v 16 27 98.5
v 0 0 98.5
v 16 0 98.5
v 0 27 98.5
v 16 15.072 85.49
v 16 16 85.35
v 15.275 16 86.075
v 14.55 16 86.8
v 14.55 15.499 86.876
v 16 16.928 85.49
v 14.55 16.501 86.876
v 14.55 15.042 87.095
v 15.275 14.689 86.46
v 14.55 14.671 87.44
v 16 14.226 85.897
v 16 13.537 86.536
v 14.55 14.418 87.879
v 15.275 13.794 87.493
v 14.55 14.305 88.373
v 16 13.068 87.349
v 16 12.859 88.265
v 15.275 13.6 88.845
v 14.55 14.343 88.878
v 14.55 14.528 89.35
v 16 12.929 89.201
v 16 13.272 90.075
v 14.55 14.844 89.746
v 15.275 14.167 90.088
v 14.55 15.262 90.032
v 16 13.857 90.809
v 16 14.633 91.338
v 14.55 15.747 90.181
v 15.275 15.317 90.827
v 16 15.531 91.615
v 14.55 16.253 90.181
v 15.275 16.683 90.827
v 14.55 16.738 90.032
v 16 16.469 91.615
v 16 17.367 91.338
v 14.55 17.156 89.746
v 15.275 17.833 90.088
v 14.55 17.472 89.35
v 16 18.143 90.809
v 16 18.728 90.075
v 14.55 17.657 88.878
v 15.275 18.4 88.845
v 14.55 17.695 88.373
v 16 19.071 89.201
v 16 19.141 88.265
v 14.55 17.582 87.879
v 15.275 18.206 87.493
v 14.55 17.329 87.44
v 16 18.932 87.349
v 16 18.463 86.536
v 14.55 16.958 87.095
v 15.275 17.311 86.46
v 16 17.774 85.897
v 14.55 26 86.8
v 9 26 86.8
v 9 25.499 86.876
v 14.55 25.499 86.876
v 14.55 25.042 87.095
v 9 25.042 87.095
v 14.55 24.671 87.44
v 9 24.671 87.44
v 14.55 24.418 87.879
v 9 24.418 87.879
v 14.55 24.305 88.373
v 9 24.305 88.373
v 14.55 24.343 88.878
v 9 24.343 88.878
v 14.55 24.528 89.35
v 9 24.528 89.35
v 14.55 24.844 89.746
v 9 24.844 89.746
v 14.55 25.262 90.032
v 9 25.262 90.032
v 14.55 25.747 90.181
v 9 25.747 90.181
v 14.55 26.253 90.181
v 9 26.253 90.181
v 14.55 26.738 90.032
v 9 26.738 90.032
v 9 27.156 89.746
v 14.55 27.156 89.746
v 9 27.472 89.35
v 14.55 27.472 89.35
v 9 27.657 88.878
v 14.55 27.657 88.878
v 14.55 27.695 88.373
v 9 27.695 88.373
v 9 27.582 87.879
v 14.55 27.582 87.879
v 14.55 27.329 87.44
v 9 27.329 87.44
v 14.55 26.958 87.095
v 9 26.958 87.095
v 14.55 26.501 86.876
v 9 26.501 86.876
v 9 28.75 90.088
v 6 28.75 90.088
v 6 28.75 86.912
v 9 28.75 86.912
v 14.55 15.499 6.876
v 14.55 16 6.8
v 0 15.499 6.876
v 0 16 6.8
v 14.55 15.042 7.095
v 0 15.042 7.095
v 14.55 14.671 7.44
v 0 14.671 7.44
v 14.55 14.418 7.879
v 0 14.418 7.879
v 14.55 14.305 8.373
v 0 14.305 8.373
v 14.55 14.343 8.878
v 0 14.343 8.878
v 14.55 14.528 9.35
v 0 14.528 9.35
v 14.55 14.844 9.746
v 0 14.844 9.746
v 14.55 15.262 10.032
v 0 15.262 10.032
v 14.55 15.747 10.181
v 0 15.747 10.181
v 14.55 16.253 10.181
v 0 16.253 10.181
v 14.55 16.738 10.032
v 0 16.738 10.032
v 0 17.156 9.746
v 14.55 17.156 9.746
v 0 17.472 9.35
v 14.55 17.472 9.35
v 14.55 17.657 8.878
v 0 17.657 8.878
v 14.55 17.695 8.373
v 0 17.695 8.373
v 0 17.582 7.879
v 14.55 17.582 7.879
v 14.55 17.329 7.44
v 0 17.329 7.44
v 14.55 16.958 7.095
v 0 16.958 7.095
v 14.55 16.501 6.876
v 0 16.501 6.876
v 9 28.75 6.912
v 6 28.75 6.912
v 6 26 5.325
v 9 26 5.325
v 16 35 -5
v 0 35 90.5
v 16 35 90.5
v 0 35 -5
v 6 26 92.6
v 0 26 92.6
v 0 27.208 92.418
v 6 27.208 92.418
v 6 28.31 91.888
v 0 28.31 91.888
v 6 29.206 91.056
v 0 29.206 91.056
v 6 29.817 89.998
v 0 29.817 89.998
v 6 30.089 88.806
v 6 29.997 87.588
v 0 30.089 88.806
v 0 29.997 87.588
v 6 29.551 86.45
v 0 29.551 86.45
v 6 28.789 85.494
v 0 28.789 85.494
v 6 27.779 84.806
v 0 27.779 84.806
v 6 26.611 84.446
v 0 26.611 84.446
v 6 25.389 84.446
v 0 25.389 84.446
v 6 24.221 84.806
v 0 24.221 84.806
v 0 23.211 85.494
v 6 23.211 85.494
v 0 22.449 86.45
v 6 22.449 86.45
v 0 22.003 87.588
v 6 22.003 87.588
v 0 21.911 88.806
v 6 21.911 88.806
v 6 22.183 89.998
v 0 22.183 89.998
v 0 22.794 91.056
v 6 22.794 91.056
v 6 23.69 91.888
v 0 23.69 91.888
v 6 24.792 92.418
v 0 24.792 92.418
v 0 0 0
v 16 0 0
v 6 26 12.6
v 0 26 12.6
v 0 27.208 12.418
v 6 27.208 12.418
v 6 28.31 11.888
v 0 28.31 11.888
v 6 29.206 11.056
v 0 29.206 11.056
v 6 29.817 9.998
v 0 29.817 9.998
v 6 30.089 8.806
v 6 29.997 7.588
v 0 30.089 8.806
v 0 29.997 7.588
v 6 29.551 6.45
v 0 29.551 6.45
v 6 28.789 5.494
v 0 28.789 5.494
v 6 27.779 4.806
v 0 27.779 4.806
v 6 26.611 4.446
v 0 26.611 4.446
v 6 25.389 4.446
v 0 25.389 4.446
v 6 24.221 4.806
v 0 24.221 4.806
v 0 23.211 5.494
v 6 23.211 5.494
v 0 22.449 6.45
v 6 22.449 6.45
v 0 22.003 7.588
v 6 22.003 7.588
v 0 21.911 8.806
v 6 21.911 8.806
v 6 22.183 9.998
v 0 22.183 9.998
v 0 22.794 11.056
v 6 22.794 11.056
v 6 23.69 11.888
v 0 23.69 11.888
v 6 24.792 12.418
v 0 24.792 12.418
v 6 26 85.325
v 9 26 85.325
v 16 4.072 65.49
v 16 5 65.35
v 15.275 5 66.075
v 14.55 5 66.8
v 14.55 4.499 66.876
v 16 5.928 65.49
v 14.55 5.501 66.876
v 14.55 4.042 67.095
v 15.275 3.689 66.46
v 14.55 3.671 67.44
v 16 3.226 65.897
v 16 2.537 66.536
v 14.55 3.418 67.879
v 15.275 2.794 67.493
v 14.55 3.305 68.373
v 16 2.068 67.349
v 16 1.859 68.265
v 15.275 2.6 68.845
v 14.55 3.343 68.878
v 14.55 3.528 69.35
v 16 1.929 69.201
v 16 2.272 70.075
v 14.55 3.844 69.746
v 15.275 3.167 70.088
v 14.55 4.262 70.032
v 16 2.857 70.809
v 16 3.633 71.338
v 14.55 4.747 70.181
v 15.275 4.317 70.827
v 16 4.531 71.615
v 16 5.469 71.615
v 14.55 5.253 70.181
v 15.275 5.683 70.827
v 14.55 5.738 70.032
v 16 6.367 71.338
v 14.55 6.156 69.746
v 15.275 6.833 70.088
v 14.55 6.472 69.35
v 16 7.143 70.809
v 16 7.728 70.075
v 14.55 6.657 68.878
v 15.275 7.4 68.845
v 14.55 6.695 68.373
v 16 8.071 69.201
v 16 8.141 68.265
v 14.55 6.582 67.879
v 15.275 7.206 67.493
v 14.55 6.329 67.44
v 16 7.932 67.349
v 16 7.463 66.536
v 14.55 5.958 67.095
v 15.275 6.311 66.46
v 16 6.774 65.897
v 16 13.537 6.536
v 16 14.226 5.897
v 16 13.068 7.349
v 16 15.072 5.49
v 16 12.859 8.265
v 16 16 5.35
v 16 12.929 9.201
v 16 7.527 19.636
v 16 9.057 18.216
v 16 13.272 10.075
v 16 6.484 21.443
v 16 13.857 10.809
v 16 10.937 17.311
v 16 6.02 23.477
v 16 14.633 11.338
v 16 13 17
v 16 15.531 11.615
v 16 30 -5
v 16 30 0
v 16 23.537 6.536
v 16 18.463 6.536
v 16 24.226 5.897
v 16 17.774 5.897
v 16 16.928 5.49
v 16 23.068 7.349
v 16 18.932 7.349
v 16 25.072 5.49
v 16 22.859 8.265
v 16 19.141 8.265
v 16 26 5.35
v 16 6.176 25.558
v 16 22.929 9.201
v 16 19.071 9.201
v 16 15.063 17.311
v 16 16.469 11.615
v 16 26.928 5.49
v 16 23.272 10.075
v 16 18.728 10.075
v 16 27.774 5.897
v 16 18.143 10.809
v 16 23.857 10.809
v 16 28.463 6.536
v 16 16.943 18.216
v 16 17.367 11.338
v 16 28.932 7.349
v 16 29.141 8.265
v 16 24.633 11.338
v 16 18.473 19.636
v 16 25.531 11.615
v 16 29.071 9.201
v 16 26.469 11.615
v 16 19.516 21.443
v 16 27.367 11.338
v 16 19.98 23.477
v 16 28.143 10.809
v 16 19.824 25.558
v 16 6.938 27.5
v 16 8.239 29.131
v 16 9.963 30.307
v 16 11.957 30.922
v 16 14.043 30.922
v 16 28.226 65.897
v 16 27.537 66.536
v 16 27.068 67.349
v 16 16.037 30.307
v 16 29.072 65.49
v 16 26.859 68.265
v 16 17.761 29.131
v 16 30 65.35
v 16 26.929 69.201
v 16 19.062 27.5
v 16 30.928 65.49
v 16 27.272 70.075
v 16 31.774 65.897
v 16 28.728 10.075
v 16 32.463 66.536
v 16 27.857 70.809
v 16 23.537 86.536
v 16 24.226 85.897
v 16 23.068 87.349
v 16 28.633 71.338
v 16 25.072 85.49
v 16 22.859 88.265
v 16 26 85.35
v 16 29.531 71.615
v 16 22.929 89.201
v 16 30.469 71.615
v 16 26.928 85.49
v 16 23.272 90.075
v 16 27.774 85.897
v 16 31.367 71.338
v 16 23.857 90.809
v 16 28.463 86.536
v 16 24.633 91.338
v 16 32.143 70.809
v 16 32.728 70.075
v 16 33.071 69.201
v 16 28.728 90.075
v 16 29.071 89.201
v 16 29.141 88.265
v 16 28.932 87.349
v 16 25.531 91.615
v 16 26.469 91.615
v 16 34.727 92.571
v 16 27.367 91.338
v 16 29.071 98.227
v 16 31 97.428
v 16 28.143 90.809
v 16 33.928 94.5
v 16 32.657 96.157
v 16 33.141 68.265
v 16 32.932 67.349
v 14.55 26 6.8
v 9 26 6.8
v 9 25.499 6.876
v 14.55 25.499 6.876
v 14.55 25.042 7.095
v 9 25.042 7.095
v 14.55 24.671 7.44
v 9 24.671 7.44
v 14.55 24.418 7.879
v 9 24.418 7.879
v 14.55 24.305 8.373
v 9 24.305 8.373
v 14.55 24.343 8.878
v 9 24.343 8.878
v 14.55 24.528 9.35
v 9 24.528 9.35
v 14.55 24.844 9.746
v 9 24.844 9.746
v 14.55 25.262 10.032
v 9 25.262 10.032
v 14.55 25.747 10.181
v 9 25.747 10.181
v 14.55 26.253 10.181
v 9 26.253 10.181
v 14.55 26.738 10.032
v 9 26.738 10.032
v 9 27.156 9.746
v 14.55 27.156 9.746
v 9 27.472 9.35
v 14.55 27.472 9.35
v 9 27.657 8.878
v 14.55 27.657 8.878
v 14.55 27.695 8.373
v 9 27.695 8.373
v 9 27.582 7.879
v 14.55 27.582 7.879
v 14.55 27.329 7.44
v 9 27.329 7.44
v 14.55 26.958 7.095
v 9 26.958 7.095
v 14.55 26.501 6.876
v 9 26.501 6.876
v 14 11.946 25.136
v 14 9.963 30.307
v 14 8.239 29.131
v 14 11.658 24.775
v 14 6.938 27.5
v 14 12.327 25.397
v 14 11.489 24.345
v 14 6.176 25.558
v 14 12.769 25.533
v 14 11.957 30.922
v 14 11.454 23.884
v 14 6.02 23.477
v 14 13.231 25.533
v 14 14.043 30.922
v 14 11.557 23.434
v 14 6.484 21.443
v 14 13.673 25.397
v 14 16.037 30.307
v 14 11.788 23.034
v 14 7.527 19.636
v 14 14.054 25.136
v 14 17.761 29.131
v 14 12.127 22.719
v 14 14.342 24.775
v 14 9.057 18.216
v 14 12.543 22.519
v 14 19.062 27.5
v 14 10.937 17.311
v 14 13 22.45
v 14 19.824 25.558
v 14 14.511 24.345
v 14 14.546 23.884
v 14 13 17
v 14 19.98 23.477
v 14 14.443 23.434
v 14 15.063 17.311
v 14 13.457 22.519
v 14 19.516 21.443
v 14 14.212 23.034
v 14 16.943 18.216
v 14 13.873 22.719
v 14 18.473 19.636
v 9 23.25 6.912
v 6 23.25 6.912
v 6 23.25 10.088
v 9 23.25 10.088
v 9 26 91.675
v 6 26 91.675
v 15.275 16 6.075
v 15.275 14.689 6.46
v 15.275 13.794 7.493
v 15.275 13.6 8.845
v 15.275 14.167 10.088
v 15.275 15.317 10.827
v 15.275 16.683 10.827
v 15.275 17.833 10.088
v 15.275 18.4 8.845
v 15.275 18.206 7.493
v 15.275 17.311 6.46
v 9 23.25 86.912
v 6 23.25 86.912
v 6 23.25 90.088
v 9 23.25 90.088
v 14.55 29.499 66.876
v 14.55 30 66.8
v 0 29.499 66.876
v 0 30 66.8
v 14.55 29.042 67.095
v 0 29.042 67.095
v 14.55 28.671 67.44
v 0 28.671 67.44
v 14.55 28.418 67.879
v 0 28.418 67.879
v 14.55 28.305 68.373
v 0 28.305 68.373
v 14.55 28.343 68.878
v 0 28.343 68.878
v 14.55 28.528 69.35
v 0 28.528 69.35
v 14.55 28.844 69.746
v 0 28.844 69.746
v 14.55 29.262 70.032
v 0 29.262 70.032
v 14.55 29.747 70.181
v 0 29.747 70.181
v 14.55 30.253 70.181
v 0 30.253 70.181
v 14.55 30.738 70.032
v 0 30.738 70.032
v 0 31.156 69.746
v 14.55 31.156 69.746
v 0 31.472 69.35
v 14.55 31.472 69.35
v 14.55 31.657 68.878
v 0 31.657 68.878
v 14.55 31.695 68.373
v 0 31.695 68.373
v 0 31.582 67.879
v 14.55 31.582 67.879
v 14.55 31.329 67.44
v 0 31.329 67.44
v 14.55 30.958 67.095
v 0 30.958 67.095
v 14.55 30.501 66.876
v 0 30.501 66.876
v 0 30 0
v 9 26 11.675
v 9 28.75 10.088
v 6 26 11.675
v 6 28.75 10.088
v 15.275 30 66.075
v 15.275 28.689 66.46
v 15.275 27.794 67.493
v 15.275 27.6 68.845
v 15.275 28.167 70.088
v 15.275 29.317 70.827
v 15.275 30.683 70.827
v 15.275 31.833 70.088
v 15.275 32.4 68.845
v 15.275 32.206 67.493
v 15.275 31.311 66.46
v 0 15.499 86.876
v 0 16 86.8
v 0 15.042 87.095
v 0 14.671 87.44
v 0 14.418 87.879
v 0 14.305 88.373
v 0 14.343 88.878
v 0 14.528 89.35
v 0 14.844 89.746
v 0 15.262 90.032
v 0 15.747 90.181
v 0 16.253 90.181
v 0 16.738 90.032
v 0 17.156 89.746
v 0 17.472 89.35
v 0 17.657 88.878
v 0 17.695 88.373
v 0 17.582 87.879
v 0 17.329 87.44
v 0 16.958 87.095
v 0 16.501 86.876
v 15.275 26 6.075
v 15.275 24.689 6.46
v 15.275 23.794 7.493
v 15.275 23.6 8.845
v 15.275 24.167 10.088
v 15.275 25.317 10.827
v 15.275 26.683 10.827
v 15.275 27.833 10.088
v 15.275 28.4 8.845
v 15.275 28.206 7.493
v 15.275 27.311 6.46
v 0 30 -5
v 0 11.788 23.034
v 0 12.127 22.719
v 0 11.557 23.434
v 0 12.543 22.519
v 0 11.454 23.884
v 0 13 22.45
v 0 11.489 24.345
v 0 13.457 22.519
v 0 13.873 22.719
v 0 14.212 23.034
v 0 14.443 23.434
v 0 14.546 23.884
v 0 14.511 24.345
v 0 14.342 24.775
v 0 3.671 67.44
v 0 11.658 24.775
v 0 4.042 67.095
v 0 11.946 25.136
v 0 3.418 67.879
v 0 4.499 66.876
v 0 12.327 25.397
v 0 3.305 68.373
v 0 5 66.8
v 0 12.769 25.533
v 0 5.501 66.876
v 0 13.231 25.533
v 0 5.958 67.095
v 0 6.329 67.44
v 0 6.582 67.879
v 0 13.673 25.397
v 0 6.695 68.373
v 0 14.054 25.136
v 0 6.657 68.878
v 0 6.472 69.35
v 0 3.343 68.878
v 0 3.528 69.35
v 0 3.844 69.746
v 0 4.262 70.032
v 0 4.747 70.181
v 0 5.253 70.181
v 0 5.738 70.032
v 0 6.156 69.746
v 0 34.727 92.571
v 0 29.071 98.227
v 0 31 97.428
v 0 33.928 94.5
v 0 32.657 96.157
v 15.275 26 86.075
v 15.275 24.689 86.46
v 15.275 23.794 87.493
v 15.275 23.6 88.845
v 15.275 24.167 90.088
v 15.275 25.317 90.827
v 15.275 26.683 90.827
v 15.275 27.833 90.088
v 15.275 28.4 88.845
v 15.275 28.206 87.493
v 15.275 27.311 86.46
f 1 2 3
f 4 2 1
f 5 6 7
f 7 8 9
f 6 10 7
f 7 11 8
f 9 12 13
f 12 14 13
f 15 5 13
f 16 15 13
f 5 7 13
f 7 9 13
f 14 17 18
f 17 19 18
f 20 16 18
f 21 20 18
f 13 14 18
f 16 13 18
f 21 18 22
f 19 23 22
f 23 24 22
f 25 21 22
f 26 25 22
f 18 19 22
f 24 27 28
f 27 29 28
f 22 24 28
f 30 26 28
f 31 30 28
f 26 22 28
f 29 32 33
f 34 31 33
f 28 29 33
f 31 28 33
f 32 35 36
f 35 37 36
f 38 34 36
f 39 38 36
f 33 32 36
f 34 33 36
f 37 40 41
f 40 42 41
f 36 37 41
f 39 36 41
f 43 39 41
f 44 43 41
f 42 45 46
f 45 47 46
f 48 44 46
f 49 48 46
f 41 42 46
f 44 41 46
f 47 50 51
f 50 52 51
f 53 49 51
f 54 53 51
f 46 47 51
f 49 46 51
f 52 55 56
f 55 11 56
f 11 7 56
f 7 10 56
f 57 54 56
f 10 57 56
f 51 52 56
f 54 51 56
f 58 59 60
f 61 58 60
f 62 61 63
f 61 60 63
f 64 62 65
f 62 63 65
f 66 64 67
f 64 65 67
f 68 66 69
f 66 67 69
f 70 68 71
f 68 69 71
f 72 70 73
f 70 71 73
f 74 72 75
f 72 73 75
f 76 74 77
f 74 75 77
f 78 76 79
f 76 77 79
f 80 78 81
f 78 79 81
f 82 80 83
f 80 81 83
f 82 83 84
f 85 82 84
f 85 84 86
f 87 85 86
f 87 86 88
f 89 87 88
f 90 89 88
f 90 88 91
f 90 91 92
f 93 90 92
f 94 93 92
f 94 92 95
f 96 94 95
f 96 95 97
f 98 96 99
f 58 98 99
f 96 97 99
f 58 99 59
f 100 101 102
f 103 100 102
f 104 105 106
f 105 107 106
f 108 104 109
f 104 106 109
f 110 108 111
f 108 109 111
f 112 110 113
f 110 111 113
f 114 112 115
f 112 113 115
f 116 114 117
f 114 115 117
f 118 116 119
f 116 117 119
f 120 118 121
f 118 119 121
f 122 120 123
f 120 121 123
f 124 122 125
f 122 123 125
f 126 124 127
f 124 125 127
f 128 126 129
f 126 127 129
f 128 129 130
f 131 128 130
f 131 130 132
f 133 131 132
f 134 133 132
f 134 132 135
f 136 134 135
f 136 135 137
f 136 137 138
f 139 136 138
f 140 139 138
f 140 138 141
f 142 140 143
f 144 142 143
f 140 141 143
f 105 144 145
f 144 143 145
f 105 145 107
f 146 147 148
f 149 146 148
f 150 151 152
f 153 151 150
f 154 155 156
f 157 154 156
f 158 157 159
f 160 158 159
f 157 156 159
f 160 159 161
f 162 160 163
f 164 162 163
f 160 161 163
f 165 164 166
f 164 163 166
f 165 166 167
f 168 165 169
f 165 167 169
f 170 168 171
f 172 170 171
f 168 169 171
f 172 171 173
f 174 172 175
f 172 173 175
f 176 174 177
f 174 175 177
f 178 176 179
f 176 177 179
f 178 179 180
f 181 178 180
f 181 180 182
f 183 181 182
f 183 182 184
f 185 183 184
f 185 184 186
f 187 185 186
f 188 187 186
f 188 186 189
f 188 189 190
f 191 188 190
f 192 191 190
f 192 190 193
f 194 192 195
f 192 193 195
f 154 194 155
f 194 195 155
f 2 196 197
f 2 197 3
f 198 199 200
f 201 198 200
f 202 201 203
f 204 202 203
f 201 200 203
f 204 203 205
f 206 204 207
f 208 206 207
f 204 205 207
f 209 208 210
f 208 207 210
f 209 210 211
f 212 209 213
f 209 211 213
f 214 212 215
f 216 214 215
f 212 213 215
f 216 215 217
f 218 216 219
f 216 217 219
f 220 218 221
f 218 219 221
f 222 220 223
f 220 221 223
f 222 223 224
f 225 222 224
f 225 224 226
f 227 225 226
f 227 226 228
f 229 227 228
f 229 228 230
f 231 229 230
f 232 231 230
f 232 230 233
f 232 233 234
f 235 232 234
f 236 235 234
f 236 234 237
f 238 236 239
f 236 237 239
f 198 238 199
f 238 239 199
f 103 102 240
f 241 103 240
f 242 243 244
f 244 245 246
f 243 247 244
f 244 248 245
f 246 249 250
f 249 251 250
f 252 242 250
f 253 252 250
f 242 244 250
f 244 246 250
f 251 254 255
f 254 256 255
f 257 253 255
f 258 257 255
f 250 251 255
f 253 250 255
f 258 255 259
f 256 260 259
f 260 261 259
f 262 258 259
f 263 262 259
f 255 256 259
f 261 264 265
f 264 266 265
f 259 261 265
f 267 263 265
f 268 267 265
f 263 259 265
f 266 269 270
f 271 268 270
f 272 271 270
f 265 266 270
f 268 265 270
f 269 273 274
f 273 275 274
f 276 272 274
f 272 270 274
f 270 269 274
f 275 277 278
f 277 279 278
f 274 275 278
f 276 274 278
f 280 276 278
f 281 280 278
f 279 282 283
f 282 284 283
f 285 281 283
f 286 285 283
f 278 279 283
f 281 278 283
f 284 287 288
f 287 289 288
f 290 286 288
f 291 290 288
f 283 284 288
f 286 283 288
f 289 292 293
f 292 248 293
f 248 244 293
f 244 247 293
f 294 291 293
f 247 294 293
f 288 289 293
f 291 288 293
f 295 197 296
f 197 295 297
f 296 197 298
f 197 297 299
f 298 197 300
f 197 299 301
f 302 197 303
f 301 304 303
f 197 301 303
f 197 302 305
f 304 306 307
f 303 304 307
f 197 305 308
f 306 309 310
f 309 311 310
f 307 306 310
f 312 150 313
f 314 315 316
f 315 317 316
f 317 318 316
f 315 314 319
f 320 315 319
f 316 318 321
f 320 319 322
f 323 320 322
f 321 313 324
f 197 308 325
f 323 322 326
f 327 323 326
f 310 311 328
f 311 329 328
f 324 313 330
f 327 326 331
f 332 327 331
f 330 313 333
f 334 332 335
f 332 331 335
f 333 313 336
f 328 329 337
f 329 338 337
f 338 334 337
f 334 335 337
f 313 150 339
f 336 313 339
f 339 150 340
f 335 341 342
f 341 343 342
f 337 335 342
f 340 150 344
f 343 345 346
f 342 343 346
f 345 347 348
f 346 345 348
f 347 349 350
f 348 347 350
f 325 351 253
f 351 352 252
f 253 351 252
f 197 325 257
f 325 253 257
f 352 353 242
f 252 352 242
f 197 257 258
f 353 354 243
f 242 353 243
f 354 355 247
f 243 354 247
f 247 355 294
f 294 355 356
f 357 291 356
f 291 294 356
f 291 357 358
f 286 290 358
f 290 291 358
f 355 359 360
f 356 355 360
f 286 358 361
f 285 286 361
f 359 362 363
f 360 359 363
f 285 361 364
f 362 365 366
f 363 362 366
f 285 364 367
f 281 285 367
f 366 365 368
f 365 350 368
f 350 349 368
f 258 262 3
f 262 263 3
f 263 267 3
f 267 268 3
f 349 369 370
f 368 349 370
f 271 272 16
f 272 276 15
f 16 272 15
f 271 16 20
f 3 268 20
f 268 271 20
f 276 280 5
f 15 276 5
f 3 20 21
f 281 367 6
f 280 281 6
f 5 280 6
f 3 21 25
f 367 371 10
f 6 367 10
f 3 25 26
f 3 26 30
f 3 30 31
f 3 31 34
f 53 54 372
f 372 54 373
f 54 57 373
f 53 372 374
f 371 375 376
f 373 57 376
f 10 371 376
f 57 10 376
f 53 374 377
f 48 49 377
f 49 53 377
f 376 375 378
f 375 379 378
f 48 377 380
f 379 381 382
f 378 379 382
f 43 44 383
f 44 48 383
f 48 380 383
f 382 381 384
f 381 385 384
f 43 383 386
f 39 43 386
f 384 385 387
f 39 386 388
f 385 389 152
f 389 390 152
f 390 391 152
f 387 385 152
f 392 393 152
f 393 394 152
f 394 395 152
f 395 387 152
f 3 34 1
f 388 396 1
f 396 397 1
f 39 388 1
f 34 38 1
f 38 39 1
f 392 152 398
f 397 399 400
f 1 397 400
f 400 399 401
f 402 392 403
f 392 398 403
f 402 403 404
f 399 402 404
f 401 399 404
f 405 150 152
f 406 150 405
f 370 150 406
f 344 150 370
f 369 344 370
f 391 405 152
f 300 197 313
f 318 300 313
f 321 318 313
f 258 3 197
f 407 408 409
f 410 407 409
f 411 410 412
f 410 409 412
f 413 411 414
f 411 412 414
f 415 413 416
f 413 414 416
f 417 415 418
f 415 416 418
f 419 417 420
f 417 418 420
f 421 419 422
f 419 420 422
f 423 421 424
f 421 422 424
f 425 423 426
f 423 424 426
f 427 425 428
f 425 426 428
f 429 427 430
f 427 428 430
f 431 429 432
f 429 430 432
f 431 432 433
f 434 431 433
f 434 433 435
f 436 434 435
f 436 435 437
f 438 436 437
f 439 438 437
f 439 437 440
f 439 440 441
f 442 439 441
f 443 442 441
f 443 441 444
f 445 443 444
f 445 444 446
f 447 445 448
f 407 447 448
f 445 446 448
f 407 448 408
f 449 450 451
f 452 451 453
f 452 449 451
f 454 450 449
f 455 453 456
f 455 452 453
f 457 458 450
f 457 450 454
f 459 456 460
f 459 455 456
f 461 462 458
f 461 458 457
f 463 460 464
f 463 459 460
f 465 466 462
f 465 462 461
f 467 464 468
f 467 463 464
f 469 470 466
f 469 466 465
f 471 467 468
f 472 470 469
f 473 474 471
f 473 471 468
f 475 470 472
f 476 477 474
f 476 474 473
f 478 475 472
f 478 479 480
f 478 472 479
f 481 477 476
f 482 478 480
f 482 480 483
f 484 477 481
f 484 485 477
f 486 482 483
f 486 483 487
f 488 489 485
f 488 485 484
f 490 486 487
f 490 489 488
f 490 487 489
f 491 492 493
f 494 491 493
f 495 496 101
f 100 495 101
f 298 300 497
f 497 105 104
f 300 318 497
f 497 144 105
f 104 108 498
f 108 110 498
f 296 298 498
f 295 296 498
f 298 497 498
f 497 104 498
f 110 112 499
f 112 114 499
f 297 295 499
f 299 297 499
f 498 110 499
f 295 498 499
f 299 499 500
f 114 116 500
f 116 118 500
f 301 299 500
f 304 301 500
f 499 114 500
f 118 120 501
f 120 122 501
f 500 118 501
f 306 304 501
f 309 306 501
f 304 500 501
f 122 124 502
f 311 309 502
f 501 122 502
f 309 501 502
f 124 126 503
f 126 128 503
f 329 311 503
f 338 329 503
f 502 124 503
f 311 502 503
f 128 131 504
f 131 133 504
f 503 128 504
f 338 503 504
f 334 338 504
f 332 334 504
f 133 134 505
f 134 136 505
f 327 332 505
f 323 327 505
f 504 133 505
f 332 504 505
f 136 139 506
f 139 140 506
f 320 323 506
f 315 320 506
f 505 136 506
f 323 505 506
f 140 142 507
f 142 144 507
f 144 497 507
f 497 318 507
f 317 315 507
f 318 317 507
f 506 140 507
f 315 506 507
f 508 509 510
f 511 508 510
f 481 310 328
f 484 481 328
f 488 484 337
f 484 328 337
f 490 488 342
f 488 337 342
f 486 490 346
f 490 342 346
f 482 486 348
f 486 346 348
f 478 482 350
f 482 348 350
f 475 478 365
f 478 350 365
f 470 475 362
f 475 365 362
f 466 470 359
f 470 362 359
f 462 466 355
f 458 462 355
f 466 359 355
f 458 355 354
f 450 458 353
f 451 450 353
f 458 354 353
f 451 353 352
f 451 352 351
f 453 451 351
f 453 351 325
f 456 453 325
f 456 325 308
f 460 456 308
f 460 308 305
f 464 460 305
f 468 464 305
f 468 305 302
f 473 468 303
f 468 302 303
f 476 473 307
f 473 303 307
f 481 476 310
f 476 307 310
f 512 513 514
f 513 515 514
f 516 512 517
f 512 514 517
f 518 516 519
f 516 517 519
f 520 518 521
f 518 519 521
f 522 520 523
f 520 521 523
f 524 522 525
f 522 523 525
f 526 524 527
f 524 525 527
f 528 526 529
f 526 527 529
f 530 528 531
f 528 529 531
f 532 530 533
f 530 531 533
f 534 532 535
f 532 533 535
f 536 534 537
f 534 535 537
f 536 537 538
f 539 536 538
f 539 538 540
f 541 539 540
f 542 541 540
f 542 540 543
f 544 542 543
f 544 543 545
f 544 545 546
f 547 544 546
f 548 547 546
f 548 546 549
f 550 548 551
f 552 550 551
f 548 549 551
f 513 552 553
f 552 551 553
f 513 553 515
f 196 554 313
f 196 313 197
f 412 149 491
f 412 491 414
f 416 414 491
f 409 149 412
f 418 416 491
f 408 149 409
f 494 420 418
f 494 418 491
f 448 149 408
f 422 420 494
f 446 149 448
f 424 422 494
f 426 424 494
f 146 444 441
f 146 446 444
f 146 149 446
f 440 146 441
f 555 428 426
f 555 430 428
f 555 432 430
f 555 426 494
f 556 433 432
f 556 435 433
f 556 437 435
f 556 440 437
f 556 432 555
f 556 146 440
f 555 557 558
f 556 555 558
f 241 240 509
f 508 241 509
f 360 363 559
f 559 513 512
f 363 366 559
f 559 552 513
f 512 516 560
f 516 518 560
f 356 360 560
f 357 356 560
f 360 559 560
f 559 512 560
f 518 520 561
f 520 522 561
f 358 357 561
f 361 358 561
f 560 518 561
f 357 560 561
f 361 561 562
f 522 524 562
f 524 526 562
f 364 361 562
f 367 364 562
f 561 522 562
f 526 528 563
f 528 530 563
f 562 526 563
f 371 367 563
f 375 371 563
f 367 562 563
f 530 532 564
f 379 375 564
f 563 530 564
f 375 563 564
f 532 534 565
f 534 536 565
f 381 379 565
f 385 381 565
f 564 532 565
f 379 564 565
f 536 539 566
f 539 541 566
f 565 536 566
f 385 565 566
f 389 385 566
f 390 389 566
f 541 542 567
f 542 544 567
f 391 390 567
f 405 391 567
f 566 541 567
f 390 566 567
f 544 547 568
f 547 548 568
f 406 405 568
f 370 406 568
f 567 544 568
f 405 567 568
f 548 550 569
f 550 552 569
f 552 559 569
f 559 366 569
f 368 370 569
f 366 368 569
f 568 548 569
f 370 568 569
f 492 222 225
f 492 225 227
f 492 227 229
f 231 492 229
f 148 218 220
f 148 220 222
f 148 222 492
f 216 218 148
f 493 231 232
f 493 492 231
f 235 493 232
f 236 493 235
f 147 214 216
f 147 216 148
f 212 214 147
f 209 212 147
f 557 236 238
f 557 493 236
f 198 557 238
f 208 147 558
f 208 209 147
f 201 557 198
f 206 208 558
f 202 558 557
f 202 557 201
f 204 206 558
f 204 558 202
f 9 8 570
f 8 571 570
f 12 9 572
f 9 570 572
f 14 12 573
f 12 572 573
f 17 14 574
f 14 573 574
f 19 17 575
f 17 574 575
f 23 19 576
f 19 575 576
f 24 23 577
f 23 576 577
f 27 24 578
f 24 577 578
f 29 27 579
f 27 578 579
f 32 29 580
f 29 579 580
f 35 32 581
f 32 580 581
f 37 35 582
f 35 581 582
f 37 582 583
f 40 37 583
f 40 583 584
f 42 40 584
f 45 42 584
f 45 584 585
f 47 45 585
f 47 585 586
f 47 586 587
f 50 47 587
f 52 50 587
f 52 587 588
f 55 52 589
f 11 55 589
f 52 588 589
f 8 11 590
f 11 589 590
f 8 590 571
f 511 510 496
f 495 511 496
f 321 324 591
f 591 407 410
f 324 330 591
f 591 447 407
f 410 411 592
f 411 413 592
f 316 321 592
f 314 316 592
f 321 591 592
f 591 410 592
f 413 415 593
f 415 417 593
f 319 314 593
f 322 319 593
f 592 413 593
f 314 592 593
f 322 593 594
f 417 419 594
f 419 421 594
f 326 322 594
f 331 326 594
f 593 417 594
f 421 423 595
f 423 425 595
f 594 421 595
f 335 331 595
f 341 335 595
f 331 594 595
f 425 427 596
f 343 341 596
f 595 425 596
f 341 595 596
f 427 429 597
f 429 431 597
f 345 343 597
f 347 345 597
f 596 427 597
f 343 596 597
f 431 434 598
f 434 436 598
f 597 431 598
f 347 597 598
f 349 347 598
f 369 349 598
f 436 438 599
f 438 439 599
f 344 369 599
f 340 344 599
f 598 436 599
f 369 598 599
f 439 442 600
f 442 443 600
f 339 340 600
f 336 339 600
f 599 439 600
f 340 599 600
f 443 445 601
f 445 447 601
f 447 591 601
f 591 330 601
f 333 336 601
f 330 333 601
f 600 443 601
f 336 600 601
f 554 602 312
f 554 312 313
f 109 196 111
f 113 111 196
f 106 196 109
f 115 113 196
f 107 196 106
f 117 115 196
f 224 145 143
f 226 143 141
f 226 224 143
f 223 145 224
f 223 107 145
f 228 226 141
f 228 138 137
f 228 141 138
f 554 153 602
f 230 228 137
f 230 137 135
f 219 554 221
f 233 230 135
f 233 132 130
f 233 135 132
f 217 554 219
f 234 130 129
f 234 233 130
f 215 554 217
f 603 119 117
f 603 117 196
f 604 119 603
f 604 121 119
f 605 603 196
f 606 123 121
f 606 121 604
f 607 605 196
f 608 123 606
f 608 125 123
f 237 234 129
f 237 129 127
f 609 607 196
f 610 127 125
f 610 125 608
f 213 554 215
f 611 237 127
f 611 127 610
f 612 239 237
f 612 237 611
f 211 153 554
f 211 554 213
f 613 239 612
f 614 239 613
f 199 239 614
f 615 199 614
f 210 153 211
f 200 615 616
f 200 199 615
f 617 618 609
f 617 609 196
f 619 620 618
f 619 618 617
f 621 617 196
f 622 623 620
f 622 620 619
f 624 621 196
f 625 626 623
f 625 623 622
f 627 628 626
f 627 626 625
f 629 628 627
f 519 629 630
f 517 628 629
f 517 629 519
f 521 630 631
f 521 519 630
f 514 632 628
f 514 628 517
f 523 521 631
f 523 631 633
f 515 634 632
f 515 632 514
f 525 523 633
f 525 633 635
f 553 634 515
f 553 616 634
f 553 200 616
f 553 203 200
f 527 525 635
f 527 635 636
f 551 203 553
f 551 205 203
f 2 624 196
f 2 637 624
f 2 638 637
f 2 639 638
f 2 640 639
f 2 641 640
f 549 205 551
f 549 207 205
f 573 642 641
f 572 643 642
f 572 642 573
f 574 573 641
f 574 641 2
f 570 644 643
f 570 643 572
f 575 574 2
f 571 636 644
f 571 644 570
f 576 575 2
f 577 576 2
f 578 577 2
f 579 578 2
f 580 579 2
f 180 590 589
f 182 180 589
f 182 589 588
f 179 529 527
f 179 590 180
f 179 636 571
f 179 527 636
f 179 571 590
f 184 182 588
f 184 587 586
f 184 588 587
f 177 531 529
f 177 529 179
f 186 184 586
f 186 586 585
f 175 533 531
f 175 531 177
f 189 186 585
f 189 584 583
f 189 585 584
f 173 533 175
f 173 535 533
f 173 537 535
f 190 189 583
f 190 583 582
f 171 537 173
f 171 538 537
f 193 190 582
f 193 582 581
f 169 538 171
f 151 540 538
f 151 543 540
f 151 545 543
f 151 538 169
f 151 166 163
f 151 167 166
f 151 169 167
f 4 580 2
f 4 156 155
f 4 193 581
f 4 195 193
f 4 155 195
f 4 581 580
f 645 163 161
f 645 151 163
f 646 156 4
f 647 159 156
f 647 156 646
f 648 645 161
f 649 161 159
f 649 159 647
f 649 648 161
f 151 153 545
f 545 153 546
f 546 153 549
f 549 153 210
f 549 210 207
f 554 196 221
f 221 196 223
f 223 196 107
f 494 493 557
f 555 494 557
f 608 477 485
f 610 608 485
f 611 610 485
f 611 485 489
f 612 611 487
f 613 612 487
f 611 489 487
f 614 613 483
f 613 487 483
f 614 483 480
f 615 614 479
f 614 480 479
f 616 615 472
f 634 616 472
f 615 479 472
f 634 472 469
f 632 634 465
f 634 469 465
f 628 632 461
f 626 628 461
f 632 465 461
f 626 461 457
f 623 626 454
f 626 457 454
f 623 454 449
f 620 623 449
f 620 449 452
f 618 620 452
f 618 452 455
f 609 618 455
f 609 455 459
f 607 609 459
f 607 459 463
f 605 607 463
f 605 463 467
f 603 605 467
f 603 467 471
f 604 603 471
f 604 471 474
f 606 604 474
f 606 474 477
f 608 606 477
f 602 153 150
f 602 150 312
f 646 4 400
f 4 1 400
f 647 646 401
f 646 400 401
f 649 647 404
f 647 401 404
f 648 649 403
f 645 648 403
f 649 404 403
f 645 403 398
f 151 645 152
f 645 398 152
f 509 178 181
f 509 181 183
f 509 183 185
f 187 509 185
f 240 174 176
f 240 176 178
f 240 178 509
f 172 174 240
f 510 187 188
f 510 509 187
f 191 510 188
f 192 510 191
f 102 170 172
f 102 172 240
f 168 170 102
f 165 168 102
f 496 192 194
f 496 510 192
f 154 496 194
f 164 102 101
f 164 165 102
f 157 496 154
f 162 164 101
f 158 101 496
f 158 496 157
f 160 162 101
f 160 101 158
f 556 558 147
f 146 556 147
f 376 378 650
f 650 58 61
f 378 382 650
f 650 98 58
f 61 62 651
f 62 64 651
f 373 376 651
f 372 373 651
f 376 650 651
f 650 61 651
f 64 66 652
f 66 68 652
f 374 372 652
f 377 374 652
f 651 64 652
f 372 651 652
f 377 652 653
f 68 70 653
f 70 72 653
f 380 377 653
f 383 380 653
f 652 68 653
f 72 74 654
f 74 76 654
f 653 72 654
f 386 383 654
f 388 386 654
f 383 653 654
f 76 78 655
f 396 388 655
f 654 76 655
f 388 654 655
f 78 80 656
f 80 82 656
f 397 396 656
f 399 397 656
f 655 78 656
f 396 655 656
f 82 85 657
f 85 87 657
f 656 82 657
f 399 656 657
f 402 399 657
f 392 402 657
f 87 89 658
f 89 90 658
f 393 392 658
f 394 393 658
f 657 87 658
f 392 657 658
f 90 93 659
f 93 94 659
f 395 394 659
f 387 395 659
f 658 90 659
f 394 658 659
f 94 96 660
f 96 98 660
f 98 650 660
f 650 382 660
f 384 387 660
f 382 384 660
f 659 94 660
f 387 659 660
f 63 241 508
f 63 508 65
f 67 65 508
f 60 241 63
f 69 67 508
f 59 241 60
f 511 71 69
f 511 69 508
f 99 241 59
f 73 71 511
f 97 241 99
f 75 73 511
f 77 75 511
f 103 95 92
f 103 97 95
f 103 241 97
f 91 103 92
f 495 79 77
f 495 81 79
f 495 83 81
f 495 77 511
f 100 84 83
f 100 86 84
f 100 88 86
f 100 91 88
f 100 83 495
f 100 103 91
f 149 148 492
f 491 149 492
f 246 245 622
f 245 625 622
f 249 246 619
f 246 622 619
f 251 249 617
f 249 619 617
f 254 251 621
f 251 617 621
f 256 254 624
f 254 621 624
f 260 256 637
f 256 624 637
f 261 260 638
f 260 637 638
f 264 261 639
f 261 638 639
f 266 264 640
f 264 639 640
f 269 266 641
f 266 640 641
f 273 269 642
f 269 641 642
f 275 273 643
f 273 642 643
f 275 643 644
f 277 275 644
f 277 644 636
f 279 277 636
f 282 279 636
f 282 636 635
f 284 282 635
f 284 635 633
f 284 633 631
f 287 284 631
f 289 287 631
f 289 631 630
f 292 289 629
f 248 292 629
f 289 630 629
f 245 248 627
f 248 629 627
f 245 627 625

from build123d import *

# Parameters (mm, degrees)
BOSS_EXTRUDE1_DEPTH                                 = 16
CSK_FOR_M3_COUNTERSUNK_FLAT_HEAD_SCREW1_D           = 3.4
CSK_FOR_M3_COUNTERSUNK_FLAT_HEAD_SCREW1_CSINK_D     = 6.3
CSK_FOR_M3_COUNTERSUNK_FLAT_HEAD_SCREW1_CSINK_ANGLE = 90
CUT_EXTRUDE1_DEPTH                                  = 9
SKETCH5_R                                           = 4.1
CUT_EXTRUDE2_DEPTH                                  = 6
SKETCH6_R                                           = 1.55
CUT_EXTRUDE3_DEPTH                                  = 106.750886521
SKETCH7_R                                           = 7
CUT_EXTRUDE4_DEPTH                                  = 2
FILLET1_R                                           = 8


with BuildPart() as part:
    # Sketch1 → Boss-Extrude1 (new body)
    with BuildSketch(Plane(origin=(0, 0, 0), x_dir=(0, 0, -1), z_dir=(1, 0, 0))):
        Polygon((0, 0), (-98.5, 0), (-98.5, 35), (5, 35), (5, 30), (0, 30), align=None)
    extrude(amount=BOSS_EXTRUDE1_DEPTH)

    # CSK for M3 Countersunk Flat Head Screw1 (through all)
    with Locations(Plane(origin=(16, 26, 88.5), x_dir=(0, 0, 1), z_dir=(1, 0, 0))):
        with Locations((0, 0), (0, 10), (-20, -4), (-20, 21), (-80, 0), (-80, 10)):
            CounterSinkHole(CSK_FOR_M3_COUNTERSUNK_FLAT_HEAD_SCREW1_D / 2, CSK_FOR_M3_COUNTERSUNK_FLAT_HEAD_SCREW1_CSINK_D / 2, counter_sink_angle=CSK_FOR_M3_COUNTERSUNK_FLAT_HEAD_SCREW1_CSINK_ANGLE)

    # Sketch4 → Cut-Extrude1 (cut)
    with BuildSketch(Plane.ZY):
        Polygon((10.0875, 28.749630657), (6.9125, 28.749630657), (5.325, 26), (6.9125, 23.250369343), (10.0875, 23.250369343), (11.675, 26), align=None)
        Polygon((86.9125, 28.749630657), (85.325, 26), (86.9125, 23.250369343), (90.0875, 23.250369343), (91.675, 26), (90.0875, 28.749630657), align=None)
    extrude(amount=-CUT_EXTRUDE1_DEPTH, mode=Mode.SUBTRACT)

    # Sketch5 → Cut-Extrude2 (cut)
    with BuildSketch(Plane.ZY):
        with Locations((8.5, 26)):
            Circle(SKETCH5_R)
        with Locations((88.5, 26)):
            Circle(SKETCH5_R)
    extrude(amount=-CUT_EXTRUDE2_DEPTH, mode=Mode.SUBTRACT)

    # Sketch6 → Cut-Extrude3 (cut, through all)
    with BuildSketch(Plane(origin=(16, 0, 0), x_dir=(0, 0, -1), z_dir=(1, 0, 0))):
        with Locations((-24, 13)):
            Circle(SKETCH6_R)
    extrude(amount=-CUT_EXTRUDE3_DEPTH, mode=Mode.SUBTRACT)

    # Sketch7 → Cut-Extrude4 (cut)
    with BuildSketch(Plane(origin=(16, 0, 0), x_dir=(0, 0, -1), z_dir=(1, 0, 0))):
        with Locations((-24, 13)):
            Circle(SKETCH7_R)
    extrude(amount=-CUT_EXTRUDE4_DEPTH, mode=Mode.SUBTRACT)

    # Fillet1
    fillet1_edges = [part.edges().sort_by_distance(p)[0] for p in [
        (8, 35, 98.5),
    ]]
    fillet(fillet1_edges, radius=FILLET1_R)


solid = part.part
